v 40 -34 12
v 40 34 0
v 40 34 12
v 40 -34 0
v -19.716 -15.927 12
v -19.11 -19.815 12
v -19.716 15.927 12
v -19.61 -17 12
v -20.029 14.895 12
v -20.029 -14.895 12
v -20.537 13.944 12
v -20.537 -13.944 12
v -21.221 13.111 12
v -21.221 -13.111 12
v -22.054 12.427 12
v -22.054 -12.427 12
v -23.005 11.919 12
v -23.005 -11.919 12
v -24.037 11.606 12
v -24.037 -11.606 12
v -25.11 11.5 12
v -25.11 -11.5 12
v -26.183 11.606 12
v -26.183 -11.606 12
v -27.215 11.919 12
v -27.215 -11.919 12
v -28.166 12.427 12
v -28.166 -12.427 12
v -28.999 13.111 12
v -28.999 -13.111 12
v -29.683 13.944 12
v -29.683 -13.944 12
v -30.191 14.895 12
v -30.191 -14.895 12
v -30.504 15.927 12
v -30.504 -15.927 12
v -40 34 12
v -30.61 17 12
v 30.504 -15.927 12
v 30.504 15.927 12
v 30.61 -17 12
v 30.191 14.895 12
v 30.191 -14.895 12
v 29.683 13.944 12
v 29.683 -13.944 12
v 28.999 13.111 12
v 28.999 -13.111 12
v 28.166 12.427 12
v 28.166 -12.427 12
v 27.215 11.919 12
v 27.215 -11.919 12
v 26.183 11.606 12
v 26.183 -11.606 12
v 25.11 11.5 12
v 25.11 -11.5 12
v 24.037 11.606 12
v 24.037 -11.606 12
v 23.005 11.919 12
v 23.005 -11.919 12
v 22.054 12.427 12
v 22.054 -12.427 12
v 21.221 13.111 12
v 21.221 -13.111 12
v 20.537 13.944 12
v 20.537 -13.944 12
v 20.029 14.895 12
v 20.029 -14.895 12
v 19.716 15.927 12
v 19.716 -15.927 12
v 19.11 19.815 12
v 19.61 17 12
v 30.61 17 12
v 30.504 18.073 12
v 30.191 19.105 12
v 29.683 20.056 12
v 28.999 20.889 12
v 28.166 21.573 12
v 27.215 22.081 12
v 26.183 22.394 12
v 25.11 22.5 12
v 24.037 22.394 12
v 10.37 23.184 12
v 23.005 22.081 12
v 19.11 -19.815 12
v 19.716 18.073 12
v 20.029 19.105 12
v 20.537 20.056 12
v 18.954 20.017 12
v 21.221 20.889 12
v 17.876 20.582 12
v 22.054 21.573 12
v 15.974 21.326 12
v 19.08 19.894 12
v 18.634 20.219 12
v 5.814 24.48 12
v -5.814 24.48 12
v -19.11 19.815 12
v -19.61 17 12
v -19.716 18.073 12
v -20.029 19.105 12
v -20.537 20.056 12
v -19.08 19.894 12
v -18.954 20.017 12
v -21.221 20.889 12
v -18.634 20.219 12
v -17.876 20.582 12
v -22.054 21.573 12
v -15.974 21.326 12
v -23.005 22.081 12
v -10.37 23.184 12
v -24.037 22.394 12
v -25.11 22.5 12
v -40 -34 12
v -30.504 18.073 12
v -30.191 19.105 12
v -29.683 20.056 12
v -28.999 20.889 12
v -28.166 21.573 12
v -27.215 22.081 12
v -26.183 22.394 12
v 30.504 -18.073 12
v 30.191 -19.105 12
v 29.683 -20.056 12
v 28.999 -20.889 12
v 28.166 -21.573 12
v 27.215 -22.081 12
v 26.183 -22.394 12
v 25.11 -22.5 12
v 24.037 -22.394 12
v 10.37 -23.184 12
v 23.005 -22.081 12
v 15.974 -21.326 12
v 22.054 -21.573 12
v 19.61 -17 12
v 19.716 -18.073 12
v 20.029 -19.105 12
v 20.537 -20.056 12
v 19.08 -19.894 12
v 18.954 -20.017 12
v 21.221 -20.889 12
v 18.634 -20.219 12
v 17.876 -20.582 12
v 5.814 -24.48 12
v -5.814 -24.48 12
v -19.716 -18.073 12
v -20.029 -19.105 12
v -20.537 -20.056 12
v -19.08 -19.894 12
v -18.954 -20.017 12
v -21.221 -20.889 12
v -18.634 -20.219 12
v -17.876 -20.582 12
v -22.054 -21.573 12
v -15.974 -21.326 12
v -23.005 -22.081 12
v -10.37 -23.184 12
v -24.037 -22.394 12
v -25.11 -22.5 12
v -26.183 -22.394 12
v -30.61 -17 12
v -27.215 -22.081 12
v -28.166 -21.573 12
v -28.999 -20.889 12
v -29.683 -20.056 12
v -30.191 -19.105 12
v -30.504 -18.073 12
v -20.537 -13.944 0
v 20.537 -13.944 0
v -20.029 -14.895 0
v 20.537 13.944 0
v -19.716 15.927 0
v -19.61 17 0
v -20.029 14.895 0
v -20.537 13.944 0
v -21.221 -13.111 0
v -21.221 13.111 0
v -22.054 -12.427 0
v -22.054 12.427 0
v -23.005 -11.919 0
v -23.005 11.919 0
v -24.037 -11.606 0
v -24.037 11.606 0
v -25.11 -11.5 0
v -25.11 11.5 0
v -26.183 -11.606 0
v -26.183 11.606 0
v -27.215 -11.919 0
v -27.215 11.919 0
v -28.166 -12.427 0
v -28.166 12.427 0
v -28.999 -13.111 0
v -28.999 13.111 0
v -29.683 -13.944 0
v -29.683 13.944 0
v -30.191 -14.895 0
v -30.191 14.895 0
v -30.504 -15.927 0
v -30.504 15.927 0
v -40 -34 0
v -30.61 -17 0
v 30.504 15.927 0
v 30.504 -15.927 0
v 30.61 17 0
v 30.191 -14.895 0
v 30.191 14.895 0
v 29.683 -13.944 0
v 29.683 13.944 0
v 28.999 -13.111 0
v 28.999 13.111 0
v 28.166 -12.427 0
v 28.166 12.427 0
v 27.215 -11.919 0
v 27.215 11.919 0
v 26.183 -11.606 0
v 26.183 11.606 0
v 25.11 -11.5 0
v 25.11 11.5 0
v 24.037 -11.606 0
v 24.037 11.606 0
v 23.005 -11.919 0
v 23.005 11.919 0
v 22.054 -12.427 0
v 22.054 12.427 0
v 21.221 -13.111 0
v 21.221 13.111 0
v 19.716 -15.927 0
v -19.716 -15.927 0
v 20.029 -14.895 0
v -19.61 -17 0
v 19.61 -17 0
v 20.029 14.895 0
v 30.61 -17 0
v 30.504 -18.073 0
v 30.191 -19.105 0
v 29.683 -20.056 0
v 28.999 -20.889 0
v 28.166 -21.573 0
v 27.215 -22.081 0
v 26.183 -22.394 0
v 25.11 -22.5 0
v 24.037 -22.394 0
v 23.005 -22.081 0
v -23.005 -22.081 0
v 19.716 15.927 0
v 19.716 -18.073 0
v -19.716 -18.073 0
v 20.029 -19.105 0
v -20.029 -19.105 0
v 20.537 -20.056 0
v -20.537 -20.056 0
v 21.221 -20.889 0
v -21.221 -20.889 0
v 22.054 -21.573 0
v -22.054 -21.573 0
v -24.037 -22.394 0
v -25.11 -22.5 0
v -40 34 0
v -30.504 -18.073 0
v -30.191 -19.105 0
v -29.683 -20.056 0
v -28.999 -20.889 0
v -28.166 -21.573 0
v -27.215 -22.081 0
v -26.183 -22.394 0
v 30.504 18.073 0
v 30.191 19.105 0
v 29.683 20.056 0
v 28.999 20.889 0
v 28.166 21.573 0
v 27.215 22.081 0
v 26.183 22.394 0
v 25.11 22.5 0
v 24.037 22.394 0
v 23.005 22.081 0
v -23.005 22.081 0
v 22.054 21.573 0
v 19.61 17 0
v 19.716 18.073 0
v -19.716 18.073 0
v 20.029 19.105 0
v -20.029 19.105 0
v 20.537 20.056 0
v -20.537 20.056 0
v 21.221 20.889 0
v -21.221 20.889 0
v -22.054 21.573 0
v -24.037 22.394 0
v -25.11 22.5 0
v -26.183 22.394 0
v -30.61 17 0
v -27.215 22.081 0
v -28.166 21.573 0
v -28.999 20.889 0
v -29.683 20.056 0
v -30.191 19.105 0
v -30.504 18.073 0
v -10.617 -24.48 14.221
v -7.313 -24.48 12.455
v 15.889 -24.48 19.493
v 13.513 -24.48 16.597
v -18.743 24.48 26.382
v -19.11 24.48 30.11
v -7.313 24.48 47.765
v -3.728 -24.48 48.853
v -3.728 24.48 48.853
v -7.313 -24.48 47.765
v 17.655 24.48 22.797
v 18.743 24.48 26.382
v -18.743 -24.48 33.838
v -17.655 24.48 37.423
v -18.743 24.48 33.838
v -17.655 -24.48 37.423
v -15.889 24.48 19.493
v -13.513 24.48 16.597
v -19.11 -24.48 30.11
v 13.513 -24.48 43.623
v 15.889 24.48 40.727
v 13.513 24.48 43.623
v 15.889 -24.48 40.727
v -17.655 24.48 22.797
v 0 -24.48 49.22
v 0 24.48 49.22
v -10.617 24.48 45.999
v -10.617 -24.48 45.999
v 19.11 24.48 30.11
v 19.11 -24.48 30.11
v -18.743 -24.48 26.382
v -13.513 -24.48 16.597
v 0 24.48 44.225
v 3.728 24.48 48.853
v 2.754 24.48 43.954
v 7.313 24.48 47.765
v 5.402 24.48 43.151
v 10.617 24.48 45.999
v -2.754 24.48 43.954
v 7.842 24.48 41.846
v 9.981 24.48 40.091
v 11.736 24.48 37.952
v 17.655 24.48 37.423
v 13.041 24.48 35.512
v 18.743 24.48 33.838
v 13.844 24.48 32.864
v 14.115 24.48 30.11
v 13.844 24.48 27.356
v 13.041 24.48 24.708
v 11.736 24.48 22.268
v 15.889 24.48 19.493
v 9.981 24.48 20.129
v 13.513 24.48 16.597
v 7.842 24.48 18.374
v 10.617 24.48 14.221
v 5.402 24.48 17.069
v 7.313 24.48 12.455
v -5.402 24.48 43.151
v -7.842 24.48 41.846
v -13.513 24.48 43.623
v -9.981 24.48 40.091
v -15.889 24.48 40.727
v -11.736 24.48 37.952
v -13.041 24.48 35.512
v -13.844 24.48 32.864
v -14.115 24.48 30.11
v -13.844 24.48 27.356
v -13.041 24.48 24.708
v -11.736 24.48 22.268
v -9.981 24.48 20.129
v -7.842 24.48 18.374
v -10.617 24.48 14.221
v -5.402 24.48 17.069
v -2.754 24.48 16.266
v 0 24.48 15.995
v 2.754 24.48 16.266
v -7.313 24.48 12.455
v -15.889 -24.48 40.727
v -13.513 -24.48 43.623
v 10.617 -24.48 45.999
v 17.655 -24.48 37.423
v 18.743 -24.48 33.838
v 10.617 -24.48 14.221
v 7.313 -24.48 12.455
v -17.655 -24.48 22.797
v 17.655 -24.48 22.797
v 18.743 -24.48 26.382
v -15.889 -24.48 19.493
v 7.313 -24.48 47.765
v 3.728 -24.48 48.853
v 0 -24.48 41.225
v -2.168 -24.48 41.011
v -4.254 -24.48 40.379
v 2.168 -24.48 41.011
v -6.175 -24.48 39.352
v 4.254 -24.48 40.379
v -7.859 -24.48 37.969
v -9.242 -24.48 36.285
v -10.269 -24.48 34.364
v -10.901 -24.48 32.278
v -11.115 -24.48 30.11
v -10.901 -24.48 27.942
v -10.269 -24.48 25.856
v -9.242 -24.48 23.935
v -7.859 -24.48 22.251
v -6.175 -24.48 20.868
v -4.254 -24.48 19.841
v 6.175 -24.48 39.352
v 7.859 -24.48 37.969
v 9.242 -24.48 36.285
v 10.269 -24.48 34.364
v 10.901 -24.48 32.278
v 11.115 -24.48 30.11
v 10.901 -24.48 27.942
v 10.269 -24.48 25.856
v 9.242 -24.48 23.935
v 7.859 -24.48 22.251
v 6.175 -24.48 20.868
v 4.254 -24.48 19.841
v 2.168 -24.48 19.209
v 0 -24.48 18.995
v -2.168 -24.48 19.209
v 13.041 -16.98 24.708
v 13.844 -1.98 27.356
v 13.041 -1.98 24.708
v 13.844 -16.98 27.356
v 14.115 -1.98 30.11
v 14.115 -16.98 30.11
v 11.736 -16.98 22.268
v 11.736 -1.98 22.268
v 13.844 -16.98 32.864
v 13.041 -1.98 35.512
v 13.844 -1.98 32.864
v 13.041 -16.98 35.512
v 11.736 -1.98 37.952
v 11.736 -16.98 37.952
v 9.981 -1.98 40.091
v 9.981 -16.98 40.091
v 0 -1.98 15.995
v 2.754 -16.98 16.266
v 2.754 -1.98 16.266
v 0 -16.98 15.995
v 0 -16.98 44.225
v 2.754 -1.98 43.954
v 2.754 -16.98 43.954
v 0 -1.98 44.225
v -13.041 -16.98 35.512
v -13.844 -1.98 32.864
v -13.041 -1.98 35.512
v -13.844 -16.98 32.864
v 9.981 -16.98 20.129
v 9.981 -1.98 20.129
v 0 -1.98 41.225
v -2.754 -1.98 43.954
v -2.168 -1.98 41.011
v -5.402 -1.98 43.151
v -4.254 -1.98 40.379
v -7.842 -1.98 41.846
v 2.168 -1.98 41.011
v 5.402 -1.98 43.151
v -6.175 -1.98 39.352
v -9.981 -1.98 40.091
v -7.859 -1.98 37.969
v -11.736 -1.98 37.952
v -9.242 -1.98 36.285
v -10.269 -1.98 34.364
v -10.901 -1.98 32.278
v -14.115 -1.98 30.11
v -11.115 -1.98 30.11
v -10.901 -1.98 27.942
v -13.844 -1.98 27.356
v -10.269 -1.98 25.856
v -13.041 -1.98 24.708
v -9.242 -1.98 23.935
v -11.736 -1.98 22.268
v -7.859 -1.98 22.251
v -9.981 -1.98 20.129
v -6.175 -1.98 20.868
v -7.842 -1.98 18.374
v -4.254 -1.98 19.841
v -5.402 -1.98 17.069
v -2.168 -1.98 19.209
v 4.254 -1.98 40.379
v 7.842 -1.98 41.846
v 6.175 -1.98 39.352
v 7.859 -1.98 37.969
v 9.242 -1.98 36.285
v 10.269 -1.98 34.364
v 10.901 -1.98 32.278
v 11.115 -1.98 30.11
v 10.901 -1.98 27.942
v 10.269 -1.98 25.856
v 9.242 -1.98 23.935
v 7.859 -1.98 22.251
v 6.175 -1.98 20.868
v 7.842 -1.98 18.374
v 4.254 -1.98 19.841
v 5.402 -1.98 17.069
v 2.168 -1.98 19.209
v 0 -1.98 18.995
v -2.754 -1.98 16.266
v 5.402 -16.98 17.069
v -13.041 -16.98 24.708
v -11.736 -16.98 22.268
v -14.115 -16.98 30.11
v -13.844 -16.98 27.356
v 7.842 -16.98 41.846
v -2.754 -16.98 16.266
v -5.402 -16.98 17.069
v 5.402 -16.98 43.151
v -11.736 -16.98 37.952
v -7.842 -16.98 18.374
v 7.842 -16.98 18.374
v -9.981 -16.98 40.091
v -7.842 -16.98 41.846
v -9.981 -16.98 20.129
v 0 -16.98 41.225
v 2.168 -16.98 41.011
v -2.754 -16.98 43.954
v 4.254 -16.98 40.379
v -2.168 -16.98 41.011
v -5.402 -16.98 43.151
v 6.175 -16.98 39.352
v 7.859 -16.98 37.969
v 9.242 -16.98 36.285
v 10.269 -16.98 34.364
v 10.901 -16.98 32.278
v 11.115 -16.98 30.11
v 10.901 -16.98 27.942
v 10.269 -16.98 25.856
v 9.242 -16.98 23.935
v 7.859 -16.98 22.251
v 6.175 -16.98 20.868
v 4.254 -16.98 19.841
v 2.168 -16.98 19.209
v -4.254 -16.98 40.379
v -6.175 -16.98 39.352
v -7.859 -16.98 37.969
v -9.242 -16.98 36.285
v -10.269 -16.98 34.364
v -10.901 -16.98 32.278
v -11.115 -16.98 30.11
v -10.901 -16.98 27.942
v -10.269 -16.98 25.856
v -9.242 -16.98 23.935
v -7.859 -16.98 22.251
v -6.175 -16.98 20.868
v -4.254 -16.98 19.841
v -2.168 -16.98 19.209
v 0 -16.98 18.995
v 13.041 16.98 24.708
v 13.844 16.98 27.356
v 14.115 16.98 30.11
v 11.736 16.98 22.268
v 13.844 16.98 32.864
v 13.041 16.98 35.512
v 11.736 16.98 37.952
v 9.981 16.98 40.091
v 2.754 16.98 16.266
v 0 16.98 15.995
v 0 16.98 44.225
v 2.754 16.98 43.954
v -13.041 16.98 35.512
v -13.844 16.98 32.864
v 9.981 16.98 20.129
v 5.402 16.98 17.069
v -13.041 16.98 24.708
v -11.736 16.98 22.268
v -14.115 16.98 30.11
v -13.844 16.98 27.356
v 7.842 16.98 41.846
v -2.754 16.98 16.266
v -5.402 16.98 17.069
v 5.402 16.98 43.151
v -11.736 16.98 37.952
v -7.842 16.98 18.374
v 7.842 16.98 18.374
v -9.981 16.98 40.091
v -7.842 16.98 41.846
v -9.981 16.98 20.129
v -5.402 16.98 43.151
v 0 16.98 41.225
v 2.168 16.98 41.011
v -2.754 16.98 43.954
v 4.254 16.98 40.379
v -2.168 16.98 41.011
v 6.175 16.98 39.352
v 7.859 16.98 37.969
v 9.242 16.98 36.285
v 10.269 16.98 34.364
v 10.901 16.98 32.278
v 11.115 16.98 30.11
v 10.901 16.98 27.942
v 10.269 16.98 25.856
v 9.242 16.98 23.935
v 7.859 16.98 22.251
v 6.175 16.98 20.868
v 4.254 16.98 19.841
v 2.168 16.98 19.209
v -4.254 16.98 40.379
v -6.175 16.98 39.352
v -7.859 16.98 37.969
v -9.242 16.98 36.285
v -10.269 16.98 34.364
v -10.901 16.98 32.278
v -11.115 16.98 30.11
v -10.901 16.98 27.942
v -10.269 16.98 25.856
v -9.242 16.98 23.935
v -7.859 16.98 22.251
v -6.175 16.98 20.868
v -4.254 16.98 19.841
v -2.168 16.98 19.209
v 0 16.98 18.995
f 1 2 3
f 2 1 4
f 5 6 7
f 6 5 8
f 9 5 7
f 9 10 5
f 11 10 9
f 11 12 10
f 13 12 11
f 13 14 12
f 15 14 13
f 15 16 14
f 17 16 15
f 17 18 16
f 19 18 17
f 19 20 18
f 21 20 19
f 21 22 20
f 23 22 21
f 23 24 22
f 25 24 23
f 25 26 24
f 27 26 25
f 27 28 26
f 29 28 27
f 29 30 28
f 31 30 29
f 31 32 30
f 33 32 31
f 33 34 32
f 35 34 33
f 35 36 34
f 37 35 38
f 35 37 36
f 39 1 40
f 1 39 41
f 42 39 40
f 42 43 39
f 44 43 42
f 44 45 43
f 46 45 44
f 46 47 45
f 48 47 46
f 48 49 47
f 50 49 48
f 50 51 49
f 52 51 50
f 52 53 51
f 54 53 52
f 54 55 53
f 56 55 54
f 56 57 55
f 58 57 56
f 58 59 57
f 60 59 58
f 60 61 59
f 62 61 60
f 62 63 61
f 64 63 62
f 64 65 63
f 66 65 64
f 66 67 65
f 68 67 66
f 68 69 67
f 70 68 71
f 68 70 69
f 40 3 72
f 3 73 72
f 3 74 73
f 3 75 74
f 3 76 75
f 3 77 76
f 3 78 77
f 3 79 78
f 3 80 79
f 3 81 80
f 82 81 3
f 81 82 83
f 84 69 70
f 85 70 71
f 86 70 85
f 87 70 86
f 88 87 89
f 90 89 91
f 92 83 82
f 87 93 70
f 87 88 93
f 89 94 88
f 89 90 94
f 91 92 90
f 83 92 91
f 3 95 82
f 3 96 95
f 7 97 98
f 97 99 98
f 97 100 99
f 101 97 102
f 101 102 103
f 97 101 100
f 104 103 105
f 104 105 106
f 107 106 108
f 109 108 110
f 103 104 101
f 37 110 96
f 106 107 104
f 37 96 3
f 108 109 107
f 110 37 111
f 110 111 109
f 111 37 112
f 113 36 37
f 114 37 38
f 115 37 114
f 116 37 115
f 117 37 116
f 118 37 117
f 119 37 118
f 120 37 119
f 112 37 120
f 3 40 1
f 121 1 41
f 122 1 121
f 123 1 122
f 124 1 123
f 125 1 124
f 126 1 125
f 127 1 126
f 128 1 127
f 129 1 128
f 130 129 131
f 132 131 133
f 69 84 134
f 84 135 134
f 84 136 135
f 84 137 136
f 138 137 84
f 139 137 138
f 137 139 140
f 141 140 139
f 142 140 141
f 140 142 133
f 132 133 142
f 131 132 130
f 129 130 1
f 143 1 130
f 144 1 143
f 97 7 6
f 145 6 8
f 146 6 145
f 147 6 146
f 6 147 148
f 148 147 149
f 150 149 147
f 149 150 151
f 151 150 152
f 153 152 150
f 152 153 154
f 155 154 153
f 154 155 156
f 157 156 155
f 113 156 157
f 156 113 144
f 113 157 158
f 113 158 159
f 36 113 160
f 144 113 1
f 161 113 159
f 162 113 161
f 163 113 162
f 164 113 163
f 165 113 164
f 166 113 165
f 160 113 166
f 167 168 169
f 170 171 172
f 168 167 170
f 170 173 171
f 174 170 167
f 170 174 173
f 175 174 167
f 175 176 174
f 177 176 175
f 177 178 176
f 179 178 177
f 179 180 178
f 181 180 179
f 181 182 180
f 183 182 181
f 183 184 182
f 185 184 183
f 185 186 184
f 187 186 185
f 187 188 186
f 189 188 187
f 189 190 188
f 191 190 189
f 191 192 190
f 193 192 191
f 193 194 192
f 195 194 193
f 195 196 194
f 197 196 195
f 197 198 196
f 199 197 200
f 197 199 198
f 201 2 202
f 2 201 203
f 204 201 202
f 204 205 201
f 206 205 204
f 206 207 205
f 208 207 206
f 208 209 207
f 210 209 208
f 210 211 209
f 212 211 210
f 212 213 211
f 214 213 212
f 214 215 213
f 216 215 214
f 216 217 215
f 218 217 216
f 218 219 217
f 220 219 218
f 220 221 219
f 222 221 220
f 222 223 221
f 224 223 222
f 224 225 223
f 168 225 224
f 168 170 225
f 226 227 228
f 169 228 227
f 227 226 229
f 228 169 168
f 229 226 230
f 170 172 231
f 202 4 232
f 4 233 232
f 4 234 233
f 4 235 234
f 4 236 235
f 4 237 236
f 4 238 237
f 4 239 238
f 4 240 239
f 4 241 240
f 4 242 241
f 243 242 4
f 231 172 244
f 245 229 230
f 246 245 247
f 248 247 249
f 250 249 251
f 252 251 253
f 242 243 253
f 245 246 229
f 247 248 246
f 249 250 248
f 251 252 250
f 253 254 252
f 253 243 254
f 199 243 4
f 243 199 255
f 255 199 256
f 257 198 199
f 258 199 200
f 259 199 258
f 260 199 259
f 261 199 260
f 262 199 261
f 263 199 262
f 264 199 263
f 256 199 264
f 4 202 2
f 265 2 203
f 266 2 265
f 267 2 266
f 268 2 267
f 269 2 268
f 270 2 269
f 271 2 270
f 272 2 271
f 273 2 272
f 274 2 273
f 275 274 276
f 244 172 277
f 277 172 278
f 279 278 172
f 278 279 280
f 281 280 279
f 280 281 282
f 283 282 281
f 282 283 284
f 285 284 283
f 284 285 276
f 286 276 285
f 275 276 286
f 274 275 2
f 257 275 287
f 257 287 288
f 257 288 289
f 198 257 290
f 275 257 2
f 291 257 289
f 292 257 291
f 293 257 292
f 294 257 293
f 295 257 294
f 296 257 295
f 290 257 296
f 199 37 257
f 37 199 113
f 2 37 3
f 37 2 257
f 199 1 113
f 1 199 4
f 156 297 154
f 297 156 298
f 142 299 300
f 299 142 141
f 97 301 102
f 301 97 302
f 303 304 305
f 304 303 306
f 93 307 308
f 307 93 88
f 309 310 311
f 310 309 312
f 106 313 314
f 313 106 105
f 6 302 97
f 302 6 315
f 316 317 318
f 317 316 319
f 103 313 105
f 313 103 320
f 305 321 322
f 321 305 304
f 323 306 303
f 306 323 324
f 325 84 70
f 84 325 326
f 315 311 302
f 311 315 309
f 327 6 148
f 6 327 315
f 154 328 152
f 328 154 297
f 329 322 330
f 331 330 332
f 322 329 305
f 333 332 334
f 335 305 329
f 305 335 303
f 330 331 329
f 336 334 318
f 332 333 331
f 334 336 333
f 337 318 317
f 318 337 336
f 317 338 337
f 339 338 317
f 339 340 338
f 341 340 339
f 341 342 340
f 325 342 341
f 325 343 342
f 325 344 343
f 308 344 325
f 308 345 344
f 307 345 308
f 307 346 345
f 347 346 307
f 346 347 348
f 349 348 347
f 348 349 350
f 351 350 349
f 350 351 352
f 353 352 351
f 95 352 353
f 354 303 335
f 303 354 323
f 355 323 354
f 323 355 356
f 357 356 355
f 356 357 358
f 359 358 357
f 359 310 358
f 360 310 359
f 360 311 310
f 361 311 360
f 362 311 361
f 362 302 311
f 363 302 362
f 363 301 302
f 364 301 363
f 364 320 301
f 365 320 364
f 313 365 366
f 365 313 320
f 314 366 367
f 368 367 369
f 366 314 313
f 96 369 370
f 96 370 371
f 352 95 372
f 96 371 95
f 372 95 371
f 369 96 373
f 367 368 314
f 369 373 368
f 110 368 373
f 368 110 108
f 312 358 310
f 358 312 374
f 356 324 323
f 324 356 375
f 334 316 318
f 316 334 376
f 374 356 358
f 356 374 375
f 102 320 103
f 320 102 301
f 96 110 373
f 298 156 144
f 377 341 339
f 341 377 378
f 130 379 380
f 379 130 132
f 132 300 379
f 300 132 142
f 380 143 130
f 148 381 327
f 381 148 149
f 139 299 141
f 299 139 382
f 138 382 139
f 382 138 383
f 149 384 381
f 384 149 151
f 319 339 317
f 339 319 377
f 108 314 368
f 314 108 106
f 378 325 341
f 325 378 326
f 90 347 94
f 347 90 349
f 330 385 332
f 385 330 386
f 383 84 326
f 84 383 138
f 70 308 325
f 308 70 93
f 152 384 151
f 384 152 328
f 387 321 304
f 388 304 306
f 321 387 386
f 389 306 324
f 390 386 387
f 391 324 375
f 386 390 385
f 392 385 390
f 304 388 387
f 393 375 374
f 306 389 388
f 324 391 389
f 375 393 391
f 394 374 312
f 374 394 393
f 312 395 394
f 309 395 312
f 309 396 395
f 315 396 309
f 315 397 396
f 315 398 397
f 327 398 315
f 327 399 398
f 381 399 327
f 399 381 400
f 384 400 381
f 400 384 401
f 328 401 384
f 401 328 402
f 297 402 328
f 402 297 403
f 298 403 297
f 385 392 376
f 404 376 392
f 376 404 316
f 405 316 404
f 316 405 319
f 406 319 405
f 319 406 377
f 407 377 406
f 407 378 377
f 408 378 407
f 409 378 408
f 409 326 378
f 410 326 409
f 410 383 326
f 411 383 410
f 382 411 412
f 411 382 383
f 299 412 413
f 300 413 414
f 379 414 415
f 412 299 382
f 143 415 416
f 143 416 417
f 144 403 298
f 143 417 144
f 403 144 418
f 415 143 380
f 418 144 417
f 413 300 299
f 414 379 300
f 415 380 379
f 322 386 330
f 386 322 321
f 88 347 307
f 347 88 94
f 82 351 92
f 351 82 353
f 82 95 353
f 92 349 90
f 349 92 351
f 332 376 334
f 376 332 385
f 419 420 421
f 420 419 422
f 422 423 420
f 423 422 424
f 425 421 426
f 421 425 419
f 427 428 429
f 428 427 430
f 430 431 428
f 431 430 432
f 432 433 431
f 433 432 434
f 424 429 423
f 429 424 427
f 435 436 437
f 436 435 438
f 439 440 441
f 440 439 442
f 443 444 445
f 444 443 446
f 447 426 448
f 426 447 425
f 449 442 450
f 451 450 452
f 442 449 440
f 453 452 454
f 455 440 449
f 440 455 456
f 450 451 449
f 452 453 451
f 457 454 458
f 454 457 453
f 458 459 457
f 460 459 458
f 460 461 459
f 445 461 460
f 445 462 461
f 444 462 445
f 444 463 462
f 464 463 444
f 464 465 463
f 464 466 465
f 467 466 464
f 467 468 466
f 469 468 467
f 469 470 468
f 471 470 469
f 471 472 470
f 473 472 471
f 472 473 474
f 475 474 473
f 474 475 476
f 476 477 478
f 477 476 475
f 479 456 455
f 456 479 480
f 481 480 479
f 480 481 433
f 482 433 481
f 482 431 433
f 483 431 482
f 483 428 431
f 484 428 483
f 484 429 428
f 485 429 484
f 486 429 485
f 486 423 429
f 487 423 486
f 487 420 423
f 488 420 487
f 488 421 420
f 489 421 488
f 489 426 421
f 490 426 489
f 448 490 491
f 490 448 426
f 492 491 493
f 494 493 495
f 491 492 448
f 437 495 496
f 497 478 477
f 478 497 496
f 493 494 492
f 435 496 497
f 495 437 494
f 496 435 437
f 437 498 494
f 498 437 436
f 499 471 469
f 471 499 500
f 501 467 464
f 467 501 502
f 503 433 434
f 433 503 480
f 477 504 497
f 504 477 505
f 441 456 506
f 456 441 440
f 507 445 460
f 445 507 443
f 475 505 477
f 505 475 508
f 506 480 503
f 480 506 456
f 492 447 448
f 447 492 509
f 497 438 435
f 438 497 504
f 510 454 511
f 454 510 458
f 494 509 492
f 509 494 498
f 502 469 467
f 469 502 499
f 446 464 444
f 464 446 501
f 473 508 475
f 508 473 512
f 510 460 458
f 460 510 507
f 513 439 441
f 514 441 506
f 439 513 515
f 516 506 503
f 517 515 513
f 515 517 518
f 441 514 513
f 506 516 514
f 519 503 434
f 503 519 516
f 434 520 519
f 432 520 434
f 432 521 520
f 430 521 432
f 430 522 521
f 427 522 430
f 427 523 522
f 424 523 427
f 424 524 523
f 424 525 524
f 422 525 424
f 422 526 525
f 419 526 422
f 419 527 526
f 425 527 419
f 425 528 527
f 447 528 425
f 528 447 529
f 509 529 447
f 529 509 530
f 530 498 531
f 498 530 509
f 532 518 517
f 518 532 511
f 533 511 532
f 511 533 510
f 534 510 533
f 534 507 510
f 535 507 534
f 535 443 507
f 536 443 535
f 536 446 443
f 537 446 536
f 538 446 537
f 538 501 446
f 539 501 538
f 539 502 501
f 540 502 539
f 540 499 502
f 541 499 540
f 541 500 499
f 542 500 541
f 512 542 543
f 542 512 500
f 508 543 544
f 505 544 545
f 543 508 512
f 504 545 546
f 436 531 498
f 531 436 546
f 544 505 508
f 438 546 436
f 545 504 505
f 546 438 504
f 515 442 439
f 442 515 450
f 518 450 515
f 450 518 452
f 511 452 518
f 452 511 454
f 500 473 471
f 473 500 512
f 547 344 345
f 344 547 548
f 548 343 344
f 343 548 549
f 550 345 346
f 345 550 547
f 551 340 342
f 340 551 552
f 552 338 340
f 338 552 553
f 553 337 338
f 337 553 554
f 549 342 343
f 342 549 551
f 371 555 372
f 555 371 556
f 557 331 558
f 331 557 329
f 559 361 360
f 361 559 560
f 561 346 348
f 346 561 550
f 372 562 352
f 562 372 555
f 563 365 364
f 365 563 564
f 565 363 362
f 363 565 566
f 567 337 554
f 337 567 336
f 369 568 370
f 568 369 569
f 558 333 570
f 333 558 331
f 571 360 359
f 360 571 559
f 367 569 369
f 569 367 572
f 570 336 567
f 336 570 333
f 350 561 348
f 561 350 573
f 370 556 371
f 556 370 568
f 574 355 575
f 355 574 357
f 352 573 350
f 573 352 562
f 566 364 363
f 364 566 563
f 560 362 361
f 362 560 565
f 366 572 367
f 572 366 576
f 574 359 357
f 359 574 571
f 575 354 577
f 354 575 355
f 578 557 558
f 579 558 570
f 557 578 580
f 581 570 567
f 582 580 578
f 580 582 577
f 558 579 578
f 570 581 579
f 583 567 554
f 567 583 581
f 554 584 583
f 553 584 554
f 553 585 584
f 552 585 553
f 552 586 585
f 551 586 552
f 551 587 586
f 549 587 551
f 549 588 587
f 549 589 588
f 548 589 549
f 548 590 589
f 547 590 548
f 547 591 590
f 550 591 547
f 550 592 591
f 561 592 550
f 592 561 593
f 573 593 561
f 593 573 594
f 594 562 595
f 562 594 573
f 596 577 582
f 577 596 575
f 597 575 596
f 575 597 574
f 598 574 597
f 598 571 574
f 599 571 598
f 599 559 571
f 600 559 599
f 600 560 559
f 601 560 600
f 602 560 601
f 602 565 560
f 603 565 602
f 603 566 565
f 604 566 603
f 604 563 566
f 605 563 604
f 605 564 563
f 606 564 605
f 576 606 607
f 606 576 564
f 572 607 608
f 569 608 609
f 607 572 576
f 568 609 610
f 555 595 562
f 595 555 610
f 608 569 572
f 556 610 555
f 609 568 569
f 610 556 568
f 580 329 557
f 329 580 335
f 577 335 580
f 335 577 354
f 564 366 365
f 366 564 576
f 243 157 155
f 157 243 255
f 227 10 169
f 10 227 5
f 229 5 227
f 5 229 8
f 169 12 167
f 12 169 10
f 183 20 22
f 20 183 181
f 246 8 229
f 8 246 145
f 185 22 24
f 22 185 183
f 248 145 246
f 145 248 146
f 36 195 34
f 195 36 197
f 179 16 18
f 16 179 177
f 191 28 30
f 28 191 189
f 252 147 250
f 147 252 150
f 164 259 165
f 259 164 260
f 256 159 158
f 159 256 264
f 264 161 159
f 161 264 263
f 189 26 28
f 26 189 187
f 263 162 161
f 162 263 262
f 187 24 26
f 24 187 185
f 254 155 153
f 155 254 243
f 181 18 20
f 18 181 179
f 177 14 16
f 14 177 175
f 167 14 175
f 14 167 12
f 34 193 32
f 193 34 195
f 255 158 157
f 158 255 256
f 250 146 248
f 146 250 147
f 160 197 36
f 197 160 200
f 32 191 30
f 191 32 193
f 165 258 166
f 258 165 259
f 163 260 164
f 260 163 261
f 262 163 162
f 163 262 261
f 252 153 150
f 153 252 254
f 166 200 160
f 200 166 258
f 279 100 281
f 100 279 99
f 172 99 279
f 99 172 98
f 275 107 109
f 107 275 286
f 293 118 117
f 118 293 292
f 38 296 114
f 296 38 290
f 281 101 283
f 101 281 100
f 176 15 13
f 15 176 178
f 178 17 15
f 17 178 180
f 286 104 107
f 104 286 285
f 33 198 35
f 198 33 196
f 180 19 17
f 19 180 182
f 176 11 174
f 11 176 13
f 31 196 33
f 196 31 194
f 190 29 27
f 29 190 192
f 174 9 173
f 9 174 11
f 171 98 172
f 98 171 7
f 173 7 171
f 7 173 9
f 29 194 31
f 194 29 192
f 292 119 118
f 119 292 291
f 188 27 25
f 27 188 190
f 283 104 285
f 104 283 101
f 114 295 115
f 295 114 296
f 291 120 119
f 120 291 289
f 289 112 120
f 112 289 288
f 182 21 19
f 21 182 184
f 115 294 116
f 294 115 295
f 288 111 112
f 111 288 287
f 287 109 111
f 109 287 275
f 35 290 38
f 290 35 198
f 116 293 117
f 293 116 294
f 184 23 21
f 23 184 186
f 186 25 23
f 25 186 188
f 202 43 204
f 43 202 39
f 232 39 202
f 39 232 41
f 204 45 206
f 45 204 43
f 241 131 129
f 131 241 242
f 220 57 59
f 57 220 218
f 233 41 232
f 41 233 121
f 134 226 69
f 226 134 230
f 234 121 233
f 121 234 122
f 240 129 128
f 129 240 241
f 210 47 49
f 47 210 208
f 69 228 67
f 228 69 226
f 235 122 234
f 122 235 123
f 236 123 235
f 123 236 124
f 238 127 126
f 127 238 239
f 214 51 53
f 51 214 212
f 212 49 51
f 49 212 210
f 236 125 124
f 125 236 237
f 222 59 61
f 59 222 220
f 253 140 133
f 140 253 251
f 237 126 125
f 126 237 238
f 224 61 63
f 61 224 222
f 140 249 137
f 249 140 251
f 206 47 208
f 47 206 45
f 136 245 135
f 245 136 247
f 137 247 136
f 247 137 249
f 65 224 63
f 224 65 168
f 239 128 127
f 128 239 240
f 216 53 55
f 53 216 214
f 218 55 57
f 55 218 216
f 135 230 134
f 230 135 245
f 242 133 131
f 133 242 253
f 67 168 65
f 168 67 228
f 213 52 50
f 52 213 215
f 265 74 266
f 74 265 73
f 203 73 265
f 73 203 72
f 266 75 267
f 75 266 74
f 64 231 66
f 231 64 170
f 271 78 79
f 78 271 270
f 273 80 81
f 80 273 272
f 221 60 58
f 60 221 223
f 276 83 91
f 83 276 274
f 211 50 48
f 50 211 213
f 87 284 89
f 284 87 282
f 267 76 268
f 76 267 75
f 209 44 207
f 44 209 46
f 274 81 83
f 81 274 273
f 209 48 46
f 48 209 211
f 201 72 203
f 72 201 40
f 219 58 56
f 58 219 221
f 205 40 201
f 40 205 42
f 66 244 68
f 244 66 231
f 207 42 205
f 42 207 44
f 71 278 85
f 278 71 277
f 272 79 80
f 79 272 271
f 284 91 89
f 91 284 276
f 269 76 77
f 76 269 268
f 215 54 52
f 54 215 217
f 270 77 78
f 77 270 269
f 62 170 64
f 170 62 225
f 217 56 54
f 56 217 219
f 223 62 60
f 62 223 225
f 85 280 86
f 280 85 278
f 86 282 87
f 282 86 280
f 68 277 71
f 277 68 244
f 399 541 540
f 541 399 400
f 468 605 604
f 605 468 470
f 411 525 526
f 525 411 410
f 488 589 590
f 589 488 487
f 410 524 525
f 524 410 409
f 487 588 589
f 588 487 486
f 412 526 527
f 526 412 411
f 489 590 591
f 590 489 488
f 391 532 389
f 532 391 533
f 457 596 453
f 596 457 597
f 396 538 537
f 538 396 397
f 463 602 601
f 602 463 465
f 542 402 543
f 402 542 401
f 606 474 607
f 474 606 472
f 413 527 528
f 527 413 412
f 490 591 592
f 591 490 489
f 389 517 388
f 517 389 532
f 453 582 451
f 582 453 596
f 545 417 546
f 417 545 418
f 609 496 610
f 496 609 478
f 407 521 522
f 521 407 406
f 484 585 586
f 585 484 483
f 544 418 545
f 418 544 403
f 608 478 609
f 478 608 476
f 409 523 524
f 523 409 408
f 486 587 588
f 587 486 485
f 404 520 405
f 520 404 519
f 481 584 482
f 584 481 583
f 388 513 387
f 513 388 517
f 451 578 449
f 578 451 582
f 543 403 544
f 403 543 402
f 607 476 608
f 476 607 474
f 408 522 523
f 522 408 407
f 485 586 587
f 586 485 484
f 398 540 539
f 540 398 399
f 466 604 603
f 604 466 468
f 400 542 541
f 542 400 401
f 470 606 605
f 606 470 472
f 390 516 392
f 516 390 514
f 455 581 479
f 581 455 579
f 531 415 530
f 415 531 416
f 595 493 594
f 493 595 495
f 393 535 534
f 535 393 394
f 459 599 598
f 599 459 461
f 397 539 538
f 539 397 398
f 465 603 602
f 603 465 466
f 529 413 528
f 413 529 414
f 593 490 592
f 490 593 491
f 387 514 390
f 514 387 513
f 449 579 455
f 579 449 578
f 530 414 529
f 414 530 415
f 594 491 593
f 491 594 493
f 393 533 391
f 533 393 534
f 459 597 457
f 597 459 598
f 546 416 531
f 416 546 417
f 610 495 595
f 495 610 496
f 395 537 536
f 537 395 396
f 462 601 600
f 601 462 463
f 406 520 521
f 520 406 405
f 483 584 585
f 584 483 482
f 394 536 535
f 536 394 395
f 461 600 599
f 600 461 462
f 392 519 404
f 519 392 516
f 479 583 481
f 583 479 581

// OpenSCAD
$fn = 32;

// ----------------------------------------------------------------------
// Bearing block: 80 x 68 mm base, 22.23 mm bore at 30.11 mm
// ----------------------------------------------------------------------

// --- parameters (mm) ---
base_w = 80;              // base width
base_d = 68;              // base depth
base_t = 12;              // base thickness
bore_d = 22.23;           // shaft / bearing bore
house_r = 19.11;          // housing outer radius
house_len = 48.96;        // housing length along the shaft
foot_w = 38.22;           // foot width under the housing
foot_len = 38.96;         // foot length along the shaft
axis_z = 30.11;           // bore axis height above the base
holes_d = 11;             // mounting holes
hole_x = 25.11;           // mounting hole spacing
seat_d = 10;              // bearing seat depth
seat_wall = 3;            // seat wall thickness

difference() {
  union() {
    /* base plate with its underside on z = 0 */
    translate([0, 0, base_t / 2]) cube([base_w, base_d, base_t], center = true);
    /* hull foot: a straight web blending into the round housing */
    hull() {
      translate([0, 0, base_t - 0.5]) cube([foot_w, foot_len, 1.6], center = true);
      translate([0, 0, axis_z]) rotate([-90, 0, 0]) cylinder(h = house_len, d = 2 * house_r, center = true);
    }
  }
  /* bore through the housing, 2.5 mm clear on both sides */
  translate([0, 0, axis_z]) rotate([-90, 0, 0]) cylinder(h = house_len + 5, d = bore_d, center = true);
  /* bearing seats, recessed into both ends of the housing */
  for (sy = [-1, 1]) {
    translate([0, sy * (house_len / 2 - seat_d + 2.5), axis_z]) rotate([-90, 0, 0]) cylinder(h = seat_d + 5, d = bore_d + 2 * seat_wall);
  }
  /* mounting holes through the base plate */
  for (hx = [-25.11, 25.11]) {
    for (hy = [-17, 17]) {
      translate([hx, hy, -2.5]) cylinder(h = base_t + 5, d = holes_d);
    }
  }
}
